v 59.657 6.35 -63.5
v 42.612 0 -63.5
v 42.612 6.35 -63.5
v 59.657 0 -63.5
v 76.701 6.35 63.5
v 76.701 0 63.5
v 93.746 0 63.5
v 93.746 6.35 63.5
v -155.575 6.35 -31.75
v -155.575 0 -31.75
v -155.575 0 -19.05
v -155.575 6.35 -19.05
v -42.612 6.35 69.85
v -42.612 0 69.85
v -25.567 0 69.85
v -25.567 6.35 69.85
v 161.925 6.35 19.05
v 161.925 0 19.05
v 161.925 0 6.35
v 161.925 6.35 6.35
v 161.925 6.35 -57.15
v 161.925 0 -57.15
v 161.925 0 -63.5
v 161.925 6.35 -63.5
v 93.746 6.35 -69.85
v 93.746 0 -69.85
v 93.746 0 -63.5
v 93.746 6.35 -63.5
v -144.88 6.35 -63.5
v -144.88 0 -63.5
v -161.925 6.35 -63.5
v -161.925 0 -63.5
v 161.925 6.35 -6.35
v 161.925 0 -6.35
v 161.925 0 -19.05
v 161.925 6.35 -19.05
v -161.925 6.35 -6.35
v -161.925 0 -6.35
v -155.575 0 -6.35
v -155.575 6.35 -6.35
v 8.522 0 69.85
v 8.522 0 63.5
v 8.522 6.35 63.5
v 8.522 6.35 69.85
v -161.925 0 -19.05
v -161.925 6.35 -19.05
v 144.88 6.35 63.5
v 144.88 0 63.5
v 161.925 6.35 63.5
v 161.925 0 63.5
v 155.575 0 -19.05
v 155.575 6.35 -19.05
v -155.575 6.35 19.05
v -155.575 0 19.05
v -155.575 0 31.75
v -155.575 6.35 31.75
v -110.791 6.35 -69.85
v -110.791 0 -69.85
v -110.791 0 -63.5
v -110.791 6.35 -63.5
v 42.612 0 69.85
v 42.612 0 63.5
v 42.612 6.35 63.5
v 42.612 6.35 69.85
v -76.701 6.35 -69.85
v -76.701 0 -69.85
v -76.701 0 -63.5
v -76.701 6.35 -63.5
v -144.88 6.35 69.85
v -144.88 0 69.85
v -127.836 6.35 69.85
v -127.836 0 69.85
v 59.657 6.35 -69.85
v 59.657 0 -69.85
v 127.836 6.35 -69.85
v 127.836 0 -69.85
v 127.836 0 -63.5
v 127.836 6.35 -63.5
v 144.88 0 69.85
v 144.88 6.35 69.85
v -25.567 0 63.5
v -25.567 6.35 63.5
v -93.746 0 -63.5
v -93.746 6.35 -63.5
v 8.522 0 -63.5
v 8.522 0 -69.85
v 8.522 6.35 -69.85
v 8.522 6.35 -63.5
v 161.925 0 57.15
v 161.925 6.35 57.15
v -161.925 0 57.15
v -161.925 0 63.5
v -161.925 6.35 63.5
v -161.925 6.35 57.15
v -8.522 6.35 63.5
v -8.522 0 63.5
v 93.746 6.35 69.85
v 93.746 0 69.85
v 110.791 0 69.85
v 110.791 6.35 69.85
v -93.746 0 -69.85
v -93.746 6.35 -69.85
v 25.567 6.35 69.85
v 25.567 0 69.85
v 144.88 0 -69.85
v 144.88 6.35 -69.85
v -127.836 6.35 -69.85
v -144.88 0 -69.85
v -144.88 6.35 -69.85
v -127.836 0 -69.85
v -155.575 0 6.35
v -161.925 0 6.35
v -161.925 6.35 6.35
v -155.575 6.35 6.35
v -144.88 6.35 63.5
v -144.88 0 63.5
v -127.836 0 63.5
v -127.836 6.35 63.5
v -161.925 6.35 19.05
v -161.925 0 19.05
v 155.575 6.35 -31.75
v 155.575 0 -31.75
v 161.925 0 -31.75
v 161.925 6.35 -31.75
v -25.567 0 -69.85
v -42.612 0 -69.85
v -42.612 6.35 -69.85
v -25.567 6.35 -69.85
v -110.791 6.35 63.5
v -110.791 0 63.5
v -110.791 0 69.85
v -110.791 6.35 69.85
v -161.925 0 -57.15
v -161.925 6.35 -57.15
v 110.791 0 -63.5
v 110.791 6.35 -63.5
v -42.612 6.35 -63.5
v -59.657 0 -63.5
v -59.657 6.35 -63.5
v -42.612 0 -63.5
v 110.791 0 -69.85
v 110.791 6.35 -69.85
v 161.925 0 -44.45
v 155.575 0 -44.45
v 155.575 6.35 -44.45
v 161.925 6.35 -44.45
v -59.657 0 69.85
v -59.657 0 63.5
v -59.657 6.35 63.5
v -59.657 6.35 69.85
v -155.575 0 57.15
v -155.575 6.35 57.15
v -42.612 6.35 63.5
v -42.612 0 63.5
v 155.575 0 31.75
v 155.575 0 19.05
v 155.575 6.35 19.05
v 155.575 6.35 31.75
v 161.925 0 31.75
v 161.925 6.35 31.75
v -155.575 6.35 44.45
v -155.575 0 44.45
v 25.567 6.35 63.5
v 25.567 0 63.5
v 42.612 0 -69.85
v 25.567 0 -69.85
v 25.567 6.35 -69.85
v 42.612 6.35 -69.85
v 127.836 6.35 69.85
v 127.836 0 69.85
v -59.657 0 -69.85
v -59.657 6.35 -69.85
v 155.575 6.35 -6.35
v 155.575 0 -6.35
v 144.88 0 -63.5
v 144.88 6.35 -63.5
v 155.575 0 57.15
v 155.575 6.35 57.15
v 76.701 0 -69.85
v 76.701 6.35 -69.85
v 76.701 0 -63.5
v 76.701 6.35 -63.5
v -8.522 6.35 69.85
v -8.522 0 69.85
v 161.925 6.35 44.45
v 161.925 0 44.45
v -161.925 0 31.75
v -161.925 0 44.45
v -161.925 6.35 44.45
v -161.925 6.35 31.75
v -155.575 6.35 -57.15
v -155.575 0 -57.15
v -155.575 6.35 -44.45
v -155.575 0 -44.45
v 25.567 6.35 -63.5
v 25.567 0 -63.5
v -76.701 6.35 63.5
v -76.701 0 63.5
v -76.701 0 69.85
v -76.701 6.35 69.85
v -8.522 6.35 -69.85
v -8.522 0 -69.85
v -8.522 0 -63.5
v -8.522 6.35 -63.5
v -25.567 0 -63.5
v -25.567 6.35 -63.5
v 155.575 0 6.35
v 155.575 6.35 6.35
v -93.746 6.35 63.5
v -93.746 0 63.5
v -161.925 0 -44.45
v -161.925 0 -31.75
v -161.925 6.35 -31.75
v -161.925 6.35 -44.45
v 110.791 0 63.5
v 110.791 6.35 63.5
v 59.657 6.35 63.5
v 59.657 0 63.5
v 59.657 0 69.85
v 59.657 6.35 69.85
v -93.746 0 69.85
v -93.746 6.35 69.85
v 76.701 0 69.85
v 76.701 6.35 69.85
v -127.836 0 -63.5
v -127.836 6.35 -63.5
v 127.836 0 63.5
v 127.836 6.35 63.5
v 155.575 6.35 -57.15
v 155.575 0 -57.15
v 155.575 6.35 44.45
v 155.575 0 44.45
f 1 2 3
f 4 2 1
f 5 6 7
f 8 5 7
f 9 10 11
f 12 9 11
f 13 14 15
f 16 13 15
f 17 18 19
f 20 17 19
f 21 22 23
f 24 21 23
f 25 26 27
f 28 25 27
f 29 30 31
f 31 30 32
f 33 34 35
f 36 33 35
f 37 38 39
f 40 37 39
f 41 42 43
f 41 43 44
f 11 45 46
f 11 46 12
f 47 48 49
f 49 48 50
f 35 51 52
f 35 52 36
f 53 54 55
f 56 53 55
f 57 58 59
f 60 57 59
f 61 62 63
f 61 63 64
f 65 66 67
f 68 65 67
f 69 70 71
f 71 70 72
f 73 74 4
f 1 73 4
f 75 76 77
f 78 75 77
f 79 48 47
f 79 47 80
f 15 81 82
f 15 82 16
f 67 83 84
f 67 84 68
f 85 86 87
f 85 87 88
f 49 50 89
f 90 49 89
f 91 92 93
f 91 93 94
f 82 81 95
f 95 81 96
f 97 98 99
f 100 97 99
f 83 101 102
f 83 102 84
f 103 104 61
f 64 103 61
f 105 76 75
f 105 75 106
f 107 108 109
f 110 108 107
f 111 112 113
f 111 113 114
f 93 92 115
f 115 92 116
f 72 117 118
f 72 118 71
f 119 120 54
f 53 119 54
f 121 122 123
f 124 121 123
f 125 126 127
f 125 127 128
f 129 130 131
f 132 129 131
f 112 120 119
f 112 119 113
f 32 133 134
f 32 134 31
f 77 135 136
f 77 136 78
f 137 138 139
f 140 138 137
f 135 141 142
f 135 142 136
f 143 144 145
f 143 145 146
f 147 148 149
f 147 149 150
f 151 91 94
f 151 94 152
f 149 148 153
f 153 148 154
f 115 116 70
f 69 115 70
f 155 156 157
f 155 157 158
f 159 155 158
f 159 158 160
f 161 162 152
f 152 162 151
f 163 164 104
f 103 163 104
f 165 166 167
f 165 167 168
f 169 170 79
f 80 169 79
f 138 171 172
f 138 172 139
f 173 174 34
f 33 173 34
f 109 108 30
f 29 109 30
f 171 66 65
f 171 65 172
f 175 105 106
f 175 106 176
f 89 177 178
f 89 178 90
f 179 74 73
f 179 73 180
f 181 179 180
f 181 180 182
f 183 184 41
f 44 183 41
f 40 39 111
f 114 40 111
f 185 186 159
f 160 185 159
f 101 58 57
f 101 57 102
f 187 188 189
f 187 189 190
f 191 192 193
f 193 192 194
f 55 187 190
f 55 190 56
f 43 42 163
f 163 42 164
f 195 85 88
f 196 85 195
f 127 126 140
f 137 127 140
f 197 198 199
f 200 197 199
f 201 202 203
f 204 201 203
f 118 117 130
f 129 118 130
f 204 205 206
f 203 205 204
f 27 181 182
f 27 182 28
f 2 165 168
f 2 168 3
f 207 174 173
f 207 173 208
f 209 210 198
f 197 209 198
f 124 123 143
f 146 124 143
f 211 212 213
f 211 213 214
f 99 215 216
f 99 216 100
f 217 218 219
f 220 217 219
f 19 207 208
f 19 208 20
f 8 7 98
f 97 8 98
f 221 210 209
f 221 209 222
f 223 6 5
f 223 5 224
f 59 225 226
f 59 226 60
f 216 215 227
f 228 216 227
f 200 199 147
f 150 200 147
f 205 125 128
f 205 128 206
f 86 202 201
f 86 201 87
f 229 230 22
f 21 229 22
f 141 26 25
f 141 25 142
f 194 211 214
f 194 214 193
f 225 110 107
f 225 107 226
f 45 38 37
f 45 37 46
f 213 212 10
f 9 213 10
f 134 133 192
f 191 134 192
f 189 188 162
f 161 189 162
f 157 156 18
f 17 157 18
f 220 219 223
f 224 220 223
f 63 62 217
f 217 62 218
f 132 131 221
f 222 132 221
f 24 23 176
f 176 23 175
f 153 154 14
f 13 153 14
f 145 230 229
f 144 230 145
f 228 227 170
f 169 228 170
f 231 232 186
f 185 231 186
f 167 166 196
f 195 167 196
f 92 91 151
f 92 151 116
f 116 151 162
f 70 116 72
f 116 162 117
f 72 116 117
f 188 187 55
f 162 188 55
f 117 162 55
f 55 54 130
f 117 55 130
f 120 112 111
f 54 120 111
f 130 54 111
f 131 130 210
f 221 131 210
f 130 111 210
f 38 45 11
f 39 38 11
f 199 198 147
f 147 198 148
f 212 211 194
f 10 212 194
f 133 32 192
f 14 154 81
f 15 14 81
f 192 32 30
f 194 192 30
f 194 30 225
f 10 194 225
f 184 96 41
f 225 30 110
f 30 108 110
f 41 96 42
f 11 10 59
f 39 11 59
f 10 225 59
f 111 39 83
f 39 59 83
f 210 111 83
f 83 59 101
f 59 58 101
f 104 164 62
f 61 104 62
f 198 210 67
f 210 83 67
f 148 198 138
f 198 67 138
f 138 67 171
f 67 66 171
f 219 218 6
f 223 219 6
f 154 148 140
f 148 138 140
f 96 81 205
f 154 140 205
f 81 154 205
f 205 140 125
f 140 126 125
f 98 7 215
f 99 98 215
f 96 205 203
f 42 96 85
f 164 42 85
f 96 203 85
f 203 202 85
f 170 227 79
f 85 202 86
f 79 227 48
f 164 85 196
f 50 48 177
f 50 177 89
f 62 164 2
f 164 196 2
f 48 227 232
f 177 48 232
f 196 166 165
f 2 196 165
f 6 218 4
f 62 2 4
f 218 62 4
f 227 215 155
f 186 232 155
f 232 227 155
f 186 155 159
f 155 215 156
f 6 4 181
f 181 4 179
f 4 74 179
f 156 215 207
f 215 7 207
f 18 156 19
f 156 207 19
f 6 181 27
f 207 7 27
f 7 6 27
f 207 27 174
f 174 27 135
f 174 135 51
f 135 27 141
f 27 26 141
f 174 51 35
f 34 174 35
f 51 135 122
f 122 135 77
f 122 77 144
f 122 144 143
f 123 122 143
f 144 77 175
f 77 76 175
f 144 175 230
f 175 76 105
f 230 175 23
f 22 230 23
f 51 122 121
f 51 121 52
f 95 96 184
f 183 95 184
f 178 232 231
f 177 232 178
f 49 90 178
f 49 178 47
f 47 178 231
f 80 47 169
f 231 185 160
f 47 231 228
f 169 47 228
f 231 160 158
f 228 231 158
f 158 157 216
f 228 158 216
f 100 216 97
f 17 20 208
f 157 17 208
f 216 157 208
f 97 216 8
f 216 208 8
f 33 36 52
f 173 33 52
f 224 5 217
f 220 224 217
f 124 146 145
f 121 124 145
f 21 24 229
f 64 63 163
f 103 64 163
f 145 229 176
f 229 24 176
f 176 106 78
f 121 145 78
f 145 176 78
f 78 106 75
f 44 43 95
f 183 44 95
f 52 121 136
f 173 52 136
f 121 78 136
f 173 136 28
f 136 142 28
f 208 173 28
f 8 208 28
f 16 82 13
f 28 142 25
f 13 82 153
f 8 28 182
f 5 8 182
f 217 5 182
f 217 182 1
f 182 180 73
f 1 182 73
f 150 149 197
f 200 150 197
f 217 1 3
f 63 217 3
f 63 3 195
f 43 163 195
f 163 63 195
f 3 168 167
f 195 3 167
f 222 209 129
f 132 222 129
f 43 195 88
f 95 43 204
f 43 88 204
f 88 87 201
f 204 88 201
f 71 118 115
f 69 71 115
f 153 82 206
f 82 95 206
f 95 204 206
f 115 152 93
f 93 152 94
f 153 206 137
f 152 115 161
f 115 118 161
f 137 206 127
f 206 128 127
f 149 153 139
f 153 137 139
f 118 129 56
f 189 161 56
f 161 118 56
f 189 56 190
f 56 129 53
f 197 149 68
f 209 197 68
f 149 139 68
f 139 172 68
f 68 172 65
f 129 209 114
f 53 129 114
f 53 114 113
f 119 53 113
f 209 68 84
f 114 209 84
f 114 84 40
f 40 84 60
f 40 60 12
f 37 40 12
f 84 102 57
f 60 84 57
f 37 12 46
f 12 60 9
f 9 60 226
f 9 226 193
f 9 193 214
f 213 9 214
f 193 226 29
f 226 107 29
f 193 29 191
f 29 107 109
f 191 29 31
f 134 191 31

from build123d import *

# Parameters (mm, degrees)
SKETCH1_W              = 323.85
SKETCH1_H              = 139.7
BOSS_EXTRUDE1_DEPTH    = 6.35
SKETCH2_W              = 323.85
SKETCH2_H              = 139.7
SKETCH2_W_2            = 311.15
SKETCH2_H_2            = 127
BOSS_EXTRUDE2_DEPTH    = 298.45
SKETCH3_W              = 6.35
SKETCH3_H              = 16.933333333
SKETCH3_H_2            = 16.933333334
DOOR_SLOT_DEPTH        = 12.7
SKETCH4_W              = 6.35
SKETCH4_H              = 15.875
DOOR_GUIDE_HOLES_DEPTH = 6.35
LEVER_HOLES_W          = 9.652
LEVER_HOLES_H          = 6.35
LEVER_HOLES_W_2        = 6.35
CUT_EXTRUDE1_DEPTH     = 140.7
CUT_EXTRUDE2_REACH     = 325.85
SKETCH7_R              = 26.9875
CUT_EXTRUDE3_REACH     = 325.85
SKETCH8_R              = 3.175
SKETCH9_W              = 323.85
SKETCH9_H              = 298.45
CUT_EXTRUDE4_DEPTH     = 140.7
SKETCH10_W             = 10.694736842
SKETCH10_H             = 6.35
SKETCH10_W_2           = 6.35
SKETCH10_W_3           = 17.044736842
SKETCH10_W_4           = 17.044736843
SKETCH10_H_2           = 12.7
CUT_EXTRUDE6_DEPTH     = 7.35


with BuildPart() as part:
    # Sketch1 → Boss-Extrude1 (new body)
    with BuildSketch(Plane(origin=(0, 0, 0), x_dir=(1, 0, 0), z_dir=(0, 1, 0))):
        Rectangle(SKETCH1_W, SKETCH1_H)
    extrude(amount=BOSS_EXTRUDE1_DEPTH)

    # Sketch2 → Boss-Extrude2 (add)
    with BuildSketch(Plane(origin=(0, 6.35, 0), x_dir=(1, 0, 0), z_dir=(0, 1, 0))):
        Rectangle(SKETCH2_W, SKETCH2_H)
        Rectangle(SKETCH2_W_2, SKETCH2_H_2, mode=Mode.SUBTRACT)
    extrude(amount=BOSS_EXTRUDE2_DEPTH)

    # Sketch3 → Door Slot (cut)
    with BuildSketch(Plane.XY.offset(69.85)):
        with BuildLine():
            Line((-53.975, 283.21), (-53.975, 6.35))
            Line((-53.975, 6.35), (-47.371, 6.35))
            Line((-47.371, 6.35), (-47.371, 292.354))
            Line((-47.371, 292.354), (-66.929, 292.354))
            Line((-66.929, 292.354), (-66.929, 285.75))
            Line((-66.929, 285.75), (-56.515, 285.75))
            ThreePointArc((-56.515, 285.75), (-54.718948776, 285.006051224), (-53.975, 283.21))
        make_face()
        with Locations((-37.846, 80.433333334)):
            Rectangle(SKETCH3_W, SKETCH3_H)
        with Locations((-37.846, 50.8)):
            Rectangle(SKETCH3_W, SKETCH3_H_2)
        with Locations((-37.846, 21.166666667)):
            Rectangle(SKETCH3_W, SKETCH3_H)
    extrude(amount=-DOOR_SLOT_DEPTH, mode=Mode.SUBTRACT)

    # Sketch4 → Door Guide Holes (cut)
    with BuildSketch(Plane.XY.offset(-63.5)):
        with Locations((-70.104, 284.1625)):
            Rectangle(SKETCH4_W, SKETCH4_H)
        with Locations((-70.104, 255.5875)):
            Rectangle(SKETCH4_W, SKETCH4_H)
        with Locations((-70.104, 227.0125)):
            Rectangle(SKETCH4_W, SKETCH4_H)
        with Locations((-70.104, 198.4375)):
            Rectangle(SKETCH4_W, SKETCH4_H)
        with Locations((-70.104, 169.8625)):
            Rectangle(SKETCH4_W, SKETCH4_H)
        with Locations((-70.104, 141.2875)):
            Rectangle(SKETCH4_W, SKETCH4_H)
        with Locations((-70.104, 112.7125)):
            Rectangle(SKETCH4_W, SKETCH4_H)
        with Locations((-70.104, 84.1375)):
            Rectangle(SKETCH4_W, SKETCH4_H)
        with Locations((-70.104, 55.5625)):
            Rectangle(SKETCH4_W, SKETCH4_H)
        with Locations((-70.104, 26.9875)):
            Rectangle(SKETCH4_W, SKETCH4_H)
    door_guide_holes = extrude(amount=-DOOR_GUIDE_HOLES_DEPTH, mode=Mode.SUBTRACT)

    # Mirror1: Door Guide Holes across plane
    add(door_guide_holes.mirror(Plane.ZY.offset(57.15)), mode=Mode.SUBTRACT)

    # Lever Holes → Cut-Extrude1 (cut, through all)
    with BuildSketch(Plane.XY.offset(69.85)):
        with Locations((54.102, 28.575)):
            Rectangle(LEVER_HOLES_W, LEVER_HOLES_H)
        with Locations((39.3065, 15.875)):
            Rectangle(LEVER_HOLES_W_2, LEVER_HOLES_H)
        with Locations((68.8975, 15.875)):
            Rectangle(LEVER_HOLES_W_2, LEVER_HOLES_H)
    extrude(amount=-CUT_EXTRUDE1_DEPTH, mode=Mode.SUBTRACT)

    # Sketch7 → Cut-Extrude2 (cut, up to next)
    with BuildSketch(Plane(origin=(161.925, 0, 0), x_dir=(0, 0, -1), z_dir=(1, 0, 0)), mode=Mode.PRIVATE) as cut_extrude2_sk1:
        with Locations((0, 55.372)):
            Circle(SKETCH7_R)
    cut_extrude2_tool1 = extrude(cut_extrude2_sk1.sketch, amount=-CUT_EXTRUDE2_REACH, mode=Mode.PRIVATE) & part.part
    add(cut_extrude2_tool1.solids().sort_by_distance((161.925, 55.372, 0))[0], mode=Mode.SUBTRACT)
    # Sketch7 → Cut-Extrude2 (cut, up to next)
    with BuildSketch(Plane(origin=(161.925, 0, 0), x_dir=(0, 0, -1), z_dir=(1, 0, 0)), mode=Mode.PRIVATE) as cut_extrude2_sk2:
        with BuildLine():
            Line((-37.211, 89.408), (-37.211, 92.583))
            Line((-37.211, 92.583), (-34.036, 92.583))
            ThreePointArc((-34.036, 92.583), (-39.45606403, 94.82806403), (-37.211, 89.408))
        make_face()
    cut_extrude2_tool2 = extrude(cut_extrude2_sk2.sketch, amount=-CUT_EXTRUDE2_REACH, mode=Mode.PRIVATE) & part.part
    add(cut_extrude2_tool2.solids().sort_by_distance((161.925, 93.032171, 37.660171))[0], mode=Mode.SUBTRACT)
    # Sketch7 → Cut-Extrude2 (cut, up to next)
    with BuildSketch(Plane(origin=(161.925, 0, 0), x_dir=(0, 0, -1), z_dir=(1, 0, 0)), mode=Mode.PRIVATE) as cut_extrude2_sk3:
        with BuildLine():
            Line((-34.036, 92.583), (-37.211, 92.583))
            Line((-37.211, 92.583), (-37.211, 89.408))
            ThreePointArc((-37.211, 89.408), (-34.96593597, 90.33793597), (-34.036, 92.583))
        make_face()
    cut_extrude2_tool3 = extrude(cut_extrude2_sk3.sketch, amount=-CUT_EXTRUDE2_REACH, mode=Mode.PRIVATE) & part.part
    add(cut_extrude2_tool3.solids().sort_by_distance((161.925, 91.235488, 35.863488))[0], mode=Mode.SUBTRACT)
    # Sketch7 → Cut-Extrude2 (cut, up to next)
    with BuildSketch(Plane(origin=(161.925, 0, 0), x_dir=(0, 0, -1), z_dir=(1, 0, 0)), mode=Mode.PRIVATE) as cut_extrude2_sk4:
        with BuildLine():
            Line((-37.211, 89.408), (-37.211, 92.583))
            Line((-37.211, 92.583), (-34.036, 92.583))
            ThreePointArc((-34.036, 92.583), (-39.45606403, 94.82806403), (-37.211, 89.408))
        make_face()
    cut_extrude2_tool4 = extrude(cut_extrude2_sk4.sketch, amount=-CUT_EXTRUDE2_REACH, mode=Mode.PRIVATE) & part.part
    add(cut_extrude2_tool4.solids().sort_by_distance((161.925, 93.032171, 37.660171))[0], mode=Mode.SUBTRACT)
    # Sketch7 → Cut-Extrude2 (cut, up to next)
    with BuildSketch(Plane(origin=(161.925, 0, 0), x_dir=(0, 0, -1), z_dir=(1, 0, 0)), mode=Mode.PRIVATE) as cut_extrude2_sk5:
        with BuildLine():
            Line((-34.036, 92.583), (-37.211, 92.583))
            Line((-37.211, 92.583), (-37.211, 89.408))
            ThreePointArc((-37.211, 89.408), (-34.96593597, 90.33793597), (-34.036, 92.583))
        make_face()
    cut_extrude2_tool5 = extrude(cut_extrude2_sk5.sketch, amount=-CUT_EXTRUDE2_REACH, mode=Mode.PRIVATE) & part.part
    add(cut_extrude2_tool5.solids().sort_by_distance((161.925, 91.235488, 35.863488))[0], mode=Mode.SUBTRACT)
    # Sketch7 → Cut-Extrude2 (cut, up to next)
    with BuildSketch(Plane(origin=(161.925, 0, 0), x_dir=(0, 0, -1), z_dir=(1, 0, 0)), mode=Mode.PRIVATE) as cut_extrude2_sk6:
        with BuildLine():
            ThreePointArc((40.386, 92.583), (37.211, 95.758), (34.036, 92.583))
            Line((34.036, 92.583), (37.211, 92.583))
            Line((37.211, 92.583), (37.211, 89.408))
            ThreePointArc((37.211, 89.408), (39.45606403, 90.33793597), (40.386, 92.583))
        make_face()
    cut_extrude2_tool6 = extrude(cut_extrude2_sk6.sketch, amount=-CUT_EXTRUDE2_REACH, mode=Mode.PRIVATE) & part.part
    add(cut_extrude2_tool6.solids().sort_by_distance((161.925, 93.032171, -37.660171))[0], mode=Mode.SUBTRACT)
    # Sketch7 → Cut-Extrude2 (cut, up to next)
    with BuildSketch(Plane(origin=(161.925, 0, 0), x_dir=(0, 0, -1), z_dir=(1, 0, 0)), mode=Mode.PRIVATE) as cut_extrude2_sk7:
        with BuildLine():
            Line((37.211, 92.583), (34.036, 92.583))
            ThreePointArc((34.036, 92.583), (34.96593597, 90.33793597), (37.211, 89.408))
            Line((37.211, 89.408), (37.211, 92.583))
        make_face()
    cut_extrude2_tool7 = extrude(cut_extrude2_sk7.sketch, amount=-CUT_EXTRUDE2_REACH, mode=Mode.PRIVATE) & part.part
    add(cut_extrude2_tool7.solids().sort_by_distance((161.925, 91.235488, -35.863488))[0], mode=Mode.SUBTRACT)
    # Sketch7 → Cut-Extrude2 (cut, up to next)
    with BuildSketch(Plane(origin=(161.925, 0, 0), x_dir=(0, 0, -1), z_dir=(1, 0, 0)), mode=Mode.PRIVATE) as cut_extrude2_sk8:
        with BuildLine():
            ThreePointArc((40.386, 92.583), (37.211, 95.758), (34.036, 92.583))
            Line((34.036, 92.583), (37.211, 92.583))
            Line((37.211, 92.583), (37.211, 89.408))
            ThreePointArc((37.211, 89.408), (39.45606403, 90.33793597), (40.386, 92.583))
        make_face()
    cut_extrude2_tool8 = extrude(cut_extrude2_sk8.sketch, amount=-CUT_EXTRUDE2_REACH, mode=Mode.PRIVATE) & part.part
    add(cut_extrude2_tool8.solids().sort_by_distance((161.925, 93.032171, -37.660171))[0], mode=Mode.SUBTRACT)
    # Sketch7 → Cut-Extrude2 (cut, up to next)
    with BuildSketch(Plane(origin=(161.925, 0, 0), x_dir=(0, 0, -1), z_dir=(1, 0, 0)), mode=Mode.PRIVATE) as cut_extrude2_sk9:
        with BuildLine():
            Line((37.211, 92.583), (34.036, 92.583))
            ThreePointArc((34.036, 92.583), (34.96593597, 90.33793597), (37.211, 89.408))
            Line((37.211, 89.408), (37.211, 92.583))
        make_face()
    cut_extrude2_tool9 = extrude(cut_extrude2_sk9.sketch, amount=-CUT_EXTRUDE2_REACH, mode=Mode.PRIVATE) & part.part
    add(cut_extrude2_tool9.solids().sort_by_distance((161.925, 91.235488, -35.863488))[0], mode=Mode.SUBTRACT)
    # Sketch7 → Cut-Extrude2 (cut, up to next)
    with BuildSketch(Plane(origin=(161.925, 0, 0), x_dir=(0, 0, -1), z_dir=(1, 0, 0)), mode=Mode.PRIVATE) as cut_extrude2_sk10:
        with BuildLine():
            ThreePointArc((-34.036, 18.161), (-34.96593597, 20.40606403), (-37.211, 21.336))
            Line((-37.211, 21.336), (-37.211, 18.161))
            Line((-37.211, 18.161), (-34.036, 18.161))
        make_face()
    cut_extrude2_tool10 = extrude(cut_extrude2_sk10.sketch, amount=-CUT_EXTRUDE2_REACH, mode=Mode.PRIVATE) & part.part
    add(cut_extrude2_tool10.solids().sort_by_distance((161.925, 19.508512, 35.863488))[0], mode=Mode.SUBTRACT)
    # Sketch7 → Cut-Extrude2 (cut, up to next)
    with BuildSketch(Plane(origin=(161.925, 0, 0), x_dir=(0, 0, -1), z_dir=(1, 0, 0)), mode=Mode.PRIVATE) as cut_extrude2_sk11:
        with BuildLine():
            Line((-37.211, 18.161), (-37.211, 21.336))
            ThreePointArc((-37.211, 21.336), (-39.45606403, 15.91593597), (-34.036, 18.161))
            Line((-34.036, 18.161), (-37.211, 18.161))
        make_face()
    cut_extrude2_tool11 = extrude(cut_extrude2_sk11.sketch, amount=-CUT_EXTRUDE2_REACH, mode=Mode.PRIVATE) & part.part
    add(cut_extrude2_tool11.solids().sort_by_distance((161.925, 17.711829, 37.660171))[0], mode=Mode.SUBTRACT)
    # Sketch7 → Cut-Extrude2 (cut, up to next)
    with BuildSketch(Plane(origin=(161.925, 0, 0), x_dir=(0, 0, -1), z_dir=(1, 0, 0)), mode=Mode.PRIVATE) as cut_extrude2_sk12:
        with BuildLine():
            ThreePointArc((-34.036, 18.161), (-34.96593597, 20.40606403), (-37.211, 21.336))
            Line((-37.211, 21.336), (-37.211, 18.161))
            Line((-37.211, 18.161), (-34.036, 18.161))
        make_face()
    cut_extrude2_tool12 = extrude(cut_extrude2_sk12.sketch, amount=-CUT_EXTRUDE2_REACH, mode=Mode.PRIVATE) & part.part
    add(cut_extrude2_tool12.solids().sort_by_distance((161.925, 19.508512, 35.863488))[0], mode=Mode.SUBTRACT)
    # Sketch7 → Cut-Extrude2 (cut, up to next)
    with BuildSketch(Plane(origin=(161.925, 0, 0), x_dir=(0, 0, -1), z_dir=(1, 0, 0)), mode=Mode.PRIVATE) as cut_extrude2_sk13:
        with BuildLine():
            Line((-37.211, 18.161), (-37.211, 21.336))
            ThreePointArc((-37.211, 21.336), (-39.45606403, 15.91593597), (-34.036, 18.161))
            Line((-34.036, 18.161), (-37.211, 18.161))
        make_face()
    cut_extrude2_tool13 = extrude(cut_extrude2_sk13.sketch, amount=-CUT_EXTRUDE2_REACH, mode=Mode.PRIVATE) & part.part
    add(cut_extrude2_tool13.solids().sort_by_distance((161.925, 17.711829, 37.660171))[0], mode=Mode.SUBTRACT)
    # Sketch7 → Cut-Extrude2 (cut, up to next)
    with BuildSketch(Plane(origin=(161.925, 0, 0), x_dir=(0, 0, -1), z_dir=(1, 0, 0)), mode=Mode.PRIVATE) as cut_extrude2_sk14:
        with BuildLine():
            ThreePointArc((40.386, 18.161), (39.45606403, 20.40606403), (37.211, 21.336))
            Line((37.211, 21.336), (37.211, 18.161))
            Line((37.211, 18.161), (34.036, 18.161))
            ThreePointArc((34.036, 18.161), (37.211, 14.986), (40.386, 18.161))
        make_face()
    cut_extrude2_tool14 = extrude(cut_extrude2_sk14.sketch, amount=-CUT_EXTRUDE2_REACH, mode=Mode.PRIVATE) & part.part
    add(cut_extrude2_tool14.solids().sort_by_distance((161.925, 17.711829, -37.660171))[0], mode=Mode.SUBTRACT)
    # Sketch7 → Cut-Extrude2 (cut, up to next)
    with BuildSketch(Plane(origin=(161.925, 0, 0), x_dir=(0, 0, -1), z_dir=(1, 0, 0)), mode=Mode.PRIVATE) as cut_extrude2_sk15:
        with BuildLine():
            Line((37.211, 18.161), (37.211, 21.336))
            ThreePointArc((37.211, 21.336), (34.96593597, 20.40606403), (34.036, 18.161))
            Line((34.036, 18.161), (37.211, 18.161))
        make_face()
    cut_extrude2_tool15 = extrude(cut_extrude2_sk15.sketch, amount=-CUT_EXTRUDE2_REACH, mode=Mode.PRIVATE) & part.part
    add(cut_extrude2_tool15.solids().sort_by_distance((161.925, 19.508512, -35.863488))[0], mode=Mode.SUBTRACT)
    # Sketch7 → Cut-Extrude2 (cut, up to next)
    with BuildSketch(Plane(origin=(161.925, 0, 0), x_dir=(0, 0, -1), z_dir=(1, 0, 0)), mode=Mode.PRIVATE) as cut_extrude2_sk16:
        with BuildLine():
            ThreePointArc((40.386, 18.161), (39.45606403, 20.40606403), (37.211, 21.336))
            Line((37.211, 21.336), (37.211, 18.161))
            Line((37.211, 18.161), (34.036, 18.161))
            ThreePointArc((34.036, 18.161), (37.211, 14.986), (40.386, 18.161))
        make_face()
    cut_extrude2_tool16 = extrude(cut_extrude2_sk16.sketch, amount=-CUT_EXTRUDE2_REACH, mode=Mode.PRIVATE) & part.part
    add(cut_extrude2_tool16.solids().sort_by_distance((161.925, 17.711829, -37.660171))[0], mode=Mode.SUBTRACT)
    # Sketch7 → Cut-Extrude2 (cut, up to next)
    with BuildSketch(Plane(origin=(161.925, 0, 0), x_dir=(0, 0, -1), z_dir=(1, 0, 0)), mode=Mode.PRIVATE) as cut_extrude2_sk17:
        with BuildLine():
            Line((37.211, 18.161), (37.211, 21.336))
            ThreePointArc((37.211, 21.336), (34.96593597, 20.40606403), (34.036, 18.161))
            Line((34.036, 18.161), (37.211, 18.161))
        make_face()
    cut_extrude2_tool17 = extrude(cut_extrude2_sk17.sketch, amount=-CUT_EXTRUDE2_REACH, mode=Mode.PRIVATE) & part.part
    add(cut_extrude2_tool17.solids().sort_by_distance((161.925, 19.508512, -35.863488))[0], mode=Mode.SUBTRACT)

    # Sketch8 → Cut-Extrude3 (cut, up to next)
    with BuildSketch(Plane.ZY.offset(161.925), mode=Mode.PRIVATE) as cut_extrude3_sk1:
        with Locations((0, 19.05)):
            Circle(SKETCH8_R)
    cut_extrude3_tool1 = extrude(cut_extrude3_sk1.sketch, amount=-CUT_EXTRUDE3_REACH, mode=Mode.PRIVATE) & part.part
    add(cut_extrude3_tool1.solids().sort_by_distance((-161.925, 19.05, 0))[0], mode=Mode.SUBTRACT)

    # Sketch9 → Cut-Extrude4 (cut, through all)
    with BuildSketch(Plane(origin=(0, 0, -69.85), x_dir=(-1, 0, 0), z_dir=(0, 0, -1))):
        with Locations((0, 155.575)):
            Rectangle(SKETCH9_W, SKETCH9_H)
    extrude(amount=-CUT_EXTRUDE4_DEPTH, mode=Mode.SUBTRACT)

    # Sketch10 → Cut-Extrude6 (cut, through all)
    with BuildSketch(Plane.XZ):
        with Locations((-150.227631579, 66.675)):
            Rectangle(SKETCH10_W, SKETCH10_H)
        with Locations((-158.75, 66.675)):
            Rectangle(SKETCH10_W_2, SKETCH10_H)
        with Locations((-119.313157895, 66.675)):
            Rectangle(SKETCH10_W_3, SKETCH10_H)
        with Locations((-85.223684211, 66.675)):
            Rectangle(SKETCH10_W_4, SKETCH10_H)
        with Locations((-51.134210526, 66.675)):
            Rectangle(SKETCH10_W_3, SKETCH10_H)
        with Locations((-17.044736842, 66.675)):
            Rectangle(SKETCH10_W_3, SKETCH10_H)
        with Locations((17.044736842, 66.675)):
            Rectangle(SKETCH10_W_3, SKETCH10_H)
        with Locations((51.134210526, 66.675)):
            Rectangle(SKETCH10_W_3, SKETCH10_H)
        with Locations((85.223684211, 66.675)):
            Rectangle(SKETCH10_W_4, SKETCH10_H)
        with Locations((119.313157895, 66.675)):
            Rectangle(SKETCH10_W_3, SKETCH10_H)
        with Locations((150.227631579, 66.675)):
            Rectangle(SKETCH10_W, SKETCH10_H)
        with Locations((158.75, 66.675)):
            Rectangle(SKETCH10_W_2, SKETCH10_H)
        with Locations((158.75, 50.8)):
            Rectangle(SKETCH10_W_2, SKETCH10_H_2)
        with Locations((158.75, 25.4)):
            Rectangle(SKETCH10_W_2, SKETCH10_H_2)
        with Locations((158.75, 0)):
            Rectangle(SKETCH10_W_2, SKETCH10_H_2)
        with Locations((158.75, -25.4)):
            Rectangle(SKETCH10_W_2, SKETCH10_H_2)
        with Locations((158.75, -50.8)):
            Rectangle(SKETCH10_W_2, SKETCH10_H_2)
        with Locations((158.75, -66.675)):
            Rectangle(SKETCH10_W_2, SKETCH10_H)
        with Locations((150.227631579, -66.675)):
            Rectangle(SKETCH10_W, SKETCH10_H)
        with Locations((119.313157895, -66.675)):
            Rectangle(SKETCH10_W_3, SKETCH10_H)
        with Locations((85.223684211, -66.675)):
            Rectangle(SKETCH10_W_4, SKETCH10_H)
        with Locations((51.134210526, -66.675)):
            Rectangle(SKETCH10_W_3, SKETCH10_H)
        with Locations((17.044736842, -66.675)):
            Rectangle(SKETCH10_W_3, SKETCH10_H)
        with Locations((-17.044736842, -66.675)):
            Rectangle(SKETCH10_W_3, SKETCH10_H)
        with Locations((-51.134210526, -66.675)):
            Rectangle(SKETCH10_W_3, SKETCH10_H)
        with Locations((-85.223684211, -66.675)):
            Rectangle(SKETCH10_W_4, SKETCH10_H)
        with Locations((-119.313157895, -66.675)):
            Rectangle(SKETCH10_W_3, SKETCH10_H)
        with Locations((-158.75, -66.675)):
            Rectangle(SKETCH10_W_2, SKETCH10_H)
        with Locations((-150.227631579, -66.675)):
            Rectangle(SKETCH10_W, SKETCH10_H)
        with Locations((-158.75, -50.8)):
            Rectangle(SKETCH10_W_2, SKETCH10_H_2)
        with Locations((-158.75, -25.4)):
            Rectangle(SKETCH10_W_2, SKETCH10_H_2)
        with Locations((-158.75, 0)):
            Rectangle(SKETCH10_W_2, SKETCH10_H_2)
        with Locations((-158.75, 25.4)):
            Rectangle(SKETCH10_W_2, SKETCH10_H_2)
        with Locations((-158.75, 50.8)):
            Rectangle(SKETCH10_W_2, SKETCH10_H_2)
    extrude(amount=-CUT_EXTRUDE6_DEPTH, mode=Mode.SUBTRACT)


solid = part.part
